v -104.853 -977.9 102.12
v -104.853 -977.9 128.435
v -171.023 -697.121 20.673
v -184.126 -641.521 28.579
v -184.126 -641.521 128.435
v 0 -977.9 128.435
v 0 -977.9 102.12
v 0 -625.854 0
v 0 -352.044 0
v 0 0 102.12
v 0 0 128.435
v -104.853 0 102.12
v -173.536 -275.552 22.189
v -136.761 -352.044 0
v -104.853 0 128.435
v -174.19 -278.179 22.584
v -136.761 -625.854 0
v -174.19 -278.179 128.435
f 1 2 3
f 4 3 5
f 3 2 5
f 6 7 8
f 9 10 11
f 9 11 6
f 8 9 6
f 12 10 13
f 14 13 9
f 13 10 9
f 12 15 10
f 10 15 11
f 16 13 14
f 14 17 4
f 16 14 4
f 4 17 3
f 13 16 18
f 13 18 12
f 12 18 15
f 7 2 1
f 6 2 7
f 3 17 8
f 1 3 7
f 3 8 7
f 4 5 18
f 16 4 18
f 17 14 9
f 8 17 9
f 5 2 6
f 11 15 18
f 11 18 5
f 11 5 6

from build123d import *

# Parameters (mm, degrees)
F0_W      = 306.0099184513
F0_H      = 128.4345835447
F1_DEPTH  = 977.9
F3_DEPTH  = 508
F5_DEPTH  = 1577.34
F6_W      = 96.3038355112
F6_H      = 26.3143703341
F7_DEPTH  = 2032
F9_DEPTH  = 2032
F11_DEPTH = 2032


with BuildPart() as f1:
    # F0 (on Front) → F1 (new body)
    with BuildSketch(Plane.XZ):
        with Locations((-153.0049592257, 64.2172917724)):
            Rectangle(F0_W, F0_H)
    extrude(amount=F1_DEPTH)

    # F2 (on face) → F3 (cut)
    with BuildSketch(Plane.YZ):
        Polygon((-625.8537769318, 0), (-977.9, 102.1202132106), (-977.9, 0), align=None)
        Polygon((-352.044, 0), (0, 0), (0, 102.1202132106), align=None)
    extrude(amount=-F3_DEPTH, mode=Mode.SUBTRACT)

    # F4 (on face) → F5 (cut)
    with BuildSketch(Plane.XZ.offset(977.9)):
        Polygon((-136.761367321, 0), (-306.0099184513, 102.1202132106), (-306.0099184513, 0), align=None)
    extrude(amount=-F5_DEPTH, mode=Mode.SUBTRACT)

    # F6 (on face) → F7 (cut)
    with BuildSketch(Plane(origin=(0, 0, 0), x_dir=(-1, 0, 0), z_dir=(0, 1, 0))):
        with Locations((257.8580006957, 115.2773983777)):
            Rectangle(F6_W, F6_H)
    extrude(amount=-F7_DEPTH, mode=Mode.SUBTRACT)

    # F8 (on face) → F9 (cut)
    with BuildSketch(Plane.XY.offset(128.4345835447)):
        Polygon((-223.3109489244, -475.2492566424), (-104.8530414701, 0), (-310.773730278, 0), (-310.773730278, -104.1196882725), align=None)
        Polygon((-104.8530414701, -977.9), (-223.3109489244, -475.2492566424), (-310.773730278, -826.1470794678), (-310.773730278, -977.9), align=None)
        Polygon((-310.773730278, -826.1470794678), (-223.3109489244, -475.2492566424), (-310.773730278, -104.1196882725), align=None)
    extrude(amount=-F9_DEPTH, mode=Mode.SUBTRACT)

    # F10 (on face) → F11 (cut)
    with BuildSketch(Plane.XY.offset(128.4345835447)):
        Polygon((-184.1263636062, -641.520646722), (-174.1903899803, -278.1791781165), (-476.8389761448, -662.8549098969), align=None)
    extrude(amount=-F11_DEPTH, mode=Mode.SUBTRACT)


solid = f1.part
